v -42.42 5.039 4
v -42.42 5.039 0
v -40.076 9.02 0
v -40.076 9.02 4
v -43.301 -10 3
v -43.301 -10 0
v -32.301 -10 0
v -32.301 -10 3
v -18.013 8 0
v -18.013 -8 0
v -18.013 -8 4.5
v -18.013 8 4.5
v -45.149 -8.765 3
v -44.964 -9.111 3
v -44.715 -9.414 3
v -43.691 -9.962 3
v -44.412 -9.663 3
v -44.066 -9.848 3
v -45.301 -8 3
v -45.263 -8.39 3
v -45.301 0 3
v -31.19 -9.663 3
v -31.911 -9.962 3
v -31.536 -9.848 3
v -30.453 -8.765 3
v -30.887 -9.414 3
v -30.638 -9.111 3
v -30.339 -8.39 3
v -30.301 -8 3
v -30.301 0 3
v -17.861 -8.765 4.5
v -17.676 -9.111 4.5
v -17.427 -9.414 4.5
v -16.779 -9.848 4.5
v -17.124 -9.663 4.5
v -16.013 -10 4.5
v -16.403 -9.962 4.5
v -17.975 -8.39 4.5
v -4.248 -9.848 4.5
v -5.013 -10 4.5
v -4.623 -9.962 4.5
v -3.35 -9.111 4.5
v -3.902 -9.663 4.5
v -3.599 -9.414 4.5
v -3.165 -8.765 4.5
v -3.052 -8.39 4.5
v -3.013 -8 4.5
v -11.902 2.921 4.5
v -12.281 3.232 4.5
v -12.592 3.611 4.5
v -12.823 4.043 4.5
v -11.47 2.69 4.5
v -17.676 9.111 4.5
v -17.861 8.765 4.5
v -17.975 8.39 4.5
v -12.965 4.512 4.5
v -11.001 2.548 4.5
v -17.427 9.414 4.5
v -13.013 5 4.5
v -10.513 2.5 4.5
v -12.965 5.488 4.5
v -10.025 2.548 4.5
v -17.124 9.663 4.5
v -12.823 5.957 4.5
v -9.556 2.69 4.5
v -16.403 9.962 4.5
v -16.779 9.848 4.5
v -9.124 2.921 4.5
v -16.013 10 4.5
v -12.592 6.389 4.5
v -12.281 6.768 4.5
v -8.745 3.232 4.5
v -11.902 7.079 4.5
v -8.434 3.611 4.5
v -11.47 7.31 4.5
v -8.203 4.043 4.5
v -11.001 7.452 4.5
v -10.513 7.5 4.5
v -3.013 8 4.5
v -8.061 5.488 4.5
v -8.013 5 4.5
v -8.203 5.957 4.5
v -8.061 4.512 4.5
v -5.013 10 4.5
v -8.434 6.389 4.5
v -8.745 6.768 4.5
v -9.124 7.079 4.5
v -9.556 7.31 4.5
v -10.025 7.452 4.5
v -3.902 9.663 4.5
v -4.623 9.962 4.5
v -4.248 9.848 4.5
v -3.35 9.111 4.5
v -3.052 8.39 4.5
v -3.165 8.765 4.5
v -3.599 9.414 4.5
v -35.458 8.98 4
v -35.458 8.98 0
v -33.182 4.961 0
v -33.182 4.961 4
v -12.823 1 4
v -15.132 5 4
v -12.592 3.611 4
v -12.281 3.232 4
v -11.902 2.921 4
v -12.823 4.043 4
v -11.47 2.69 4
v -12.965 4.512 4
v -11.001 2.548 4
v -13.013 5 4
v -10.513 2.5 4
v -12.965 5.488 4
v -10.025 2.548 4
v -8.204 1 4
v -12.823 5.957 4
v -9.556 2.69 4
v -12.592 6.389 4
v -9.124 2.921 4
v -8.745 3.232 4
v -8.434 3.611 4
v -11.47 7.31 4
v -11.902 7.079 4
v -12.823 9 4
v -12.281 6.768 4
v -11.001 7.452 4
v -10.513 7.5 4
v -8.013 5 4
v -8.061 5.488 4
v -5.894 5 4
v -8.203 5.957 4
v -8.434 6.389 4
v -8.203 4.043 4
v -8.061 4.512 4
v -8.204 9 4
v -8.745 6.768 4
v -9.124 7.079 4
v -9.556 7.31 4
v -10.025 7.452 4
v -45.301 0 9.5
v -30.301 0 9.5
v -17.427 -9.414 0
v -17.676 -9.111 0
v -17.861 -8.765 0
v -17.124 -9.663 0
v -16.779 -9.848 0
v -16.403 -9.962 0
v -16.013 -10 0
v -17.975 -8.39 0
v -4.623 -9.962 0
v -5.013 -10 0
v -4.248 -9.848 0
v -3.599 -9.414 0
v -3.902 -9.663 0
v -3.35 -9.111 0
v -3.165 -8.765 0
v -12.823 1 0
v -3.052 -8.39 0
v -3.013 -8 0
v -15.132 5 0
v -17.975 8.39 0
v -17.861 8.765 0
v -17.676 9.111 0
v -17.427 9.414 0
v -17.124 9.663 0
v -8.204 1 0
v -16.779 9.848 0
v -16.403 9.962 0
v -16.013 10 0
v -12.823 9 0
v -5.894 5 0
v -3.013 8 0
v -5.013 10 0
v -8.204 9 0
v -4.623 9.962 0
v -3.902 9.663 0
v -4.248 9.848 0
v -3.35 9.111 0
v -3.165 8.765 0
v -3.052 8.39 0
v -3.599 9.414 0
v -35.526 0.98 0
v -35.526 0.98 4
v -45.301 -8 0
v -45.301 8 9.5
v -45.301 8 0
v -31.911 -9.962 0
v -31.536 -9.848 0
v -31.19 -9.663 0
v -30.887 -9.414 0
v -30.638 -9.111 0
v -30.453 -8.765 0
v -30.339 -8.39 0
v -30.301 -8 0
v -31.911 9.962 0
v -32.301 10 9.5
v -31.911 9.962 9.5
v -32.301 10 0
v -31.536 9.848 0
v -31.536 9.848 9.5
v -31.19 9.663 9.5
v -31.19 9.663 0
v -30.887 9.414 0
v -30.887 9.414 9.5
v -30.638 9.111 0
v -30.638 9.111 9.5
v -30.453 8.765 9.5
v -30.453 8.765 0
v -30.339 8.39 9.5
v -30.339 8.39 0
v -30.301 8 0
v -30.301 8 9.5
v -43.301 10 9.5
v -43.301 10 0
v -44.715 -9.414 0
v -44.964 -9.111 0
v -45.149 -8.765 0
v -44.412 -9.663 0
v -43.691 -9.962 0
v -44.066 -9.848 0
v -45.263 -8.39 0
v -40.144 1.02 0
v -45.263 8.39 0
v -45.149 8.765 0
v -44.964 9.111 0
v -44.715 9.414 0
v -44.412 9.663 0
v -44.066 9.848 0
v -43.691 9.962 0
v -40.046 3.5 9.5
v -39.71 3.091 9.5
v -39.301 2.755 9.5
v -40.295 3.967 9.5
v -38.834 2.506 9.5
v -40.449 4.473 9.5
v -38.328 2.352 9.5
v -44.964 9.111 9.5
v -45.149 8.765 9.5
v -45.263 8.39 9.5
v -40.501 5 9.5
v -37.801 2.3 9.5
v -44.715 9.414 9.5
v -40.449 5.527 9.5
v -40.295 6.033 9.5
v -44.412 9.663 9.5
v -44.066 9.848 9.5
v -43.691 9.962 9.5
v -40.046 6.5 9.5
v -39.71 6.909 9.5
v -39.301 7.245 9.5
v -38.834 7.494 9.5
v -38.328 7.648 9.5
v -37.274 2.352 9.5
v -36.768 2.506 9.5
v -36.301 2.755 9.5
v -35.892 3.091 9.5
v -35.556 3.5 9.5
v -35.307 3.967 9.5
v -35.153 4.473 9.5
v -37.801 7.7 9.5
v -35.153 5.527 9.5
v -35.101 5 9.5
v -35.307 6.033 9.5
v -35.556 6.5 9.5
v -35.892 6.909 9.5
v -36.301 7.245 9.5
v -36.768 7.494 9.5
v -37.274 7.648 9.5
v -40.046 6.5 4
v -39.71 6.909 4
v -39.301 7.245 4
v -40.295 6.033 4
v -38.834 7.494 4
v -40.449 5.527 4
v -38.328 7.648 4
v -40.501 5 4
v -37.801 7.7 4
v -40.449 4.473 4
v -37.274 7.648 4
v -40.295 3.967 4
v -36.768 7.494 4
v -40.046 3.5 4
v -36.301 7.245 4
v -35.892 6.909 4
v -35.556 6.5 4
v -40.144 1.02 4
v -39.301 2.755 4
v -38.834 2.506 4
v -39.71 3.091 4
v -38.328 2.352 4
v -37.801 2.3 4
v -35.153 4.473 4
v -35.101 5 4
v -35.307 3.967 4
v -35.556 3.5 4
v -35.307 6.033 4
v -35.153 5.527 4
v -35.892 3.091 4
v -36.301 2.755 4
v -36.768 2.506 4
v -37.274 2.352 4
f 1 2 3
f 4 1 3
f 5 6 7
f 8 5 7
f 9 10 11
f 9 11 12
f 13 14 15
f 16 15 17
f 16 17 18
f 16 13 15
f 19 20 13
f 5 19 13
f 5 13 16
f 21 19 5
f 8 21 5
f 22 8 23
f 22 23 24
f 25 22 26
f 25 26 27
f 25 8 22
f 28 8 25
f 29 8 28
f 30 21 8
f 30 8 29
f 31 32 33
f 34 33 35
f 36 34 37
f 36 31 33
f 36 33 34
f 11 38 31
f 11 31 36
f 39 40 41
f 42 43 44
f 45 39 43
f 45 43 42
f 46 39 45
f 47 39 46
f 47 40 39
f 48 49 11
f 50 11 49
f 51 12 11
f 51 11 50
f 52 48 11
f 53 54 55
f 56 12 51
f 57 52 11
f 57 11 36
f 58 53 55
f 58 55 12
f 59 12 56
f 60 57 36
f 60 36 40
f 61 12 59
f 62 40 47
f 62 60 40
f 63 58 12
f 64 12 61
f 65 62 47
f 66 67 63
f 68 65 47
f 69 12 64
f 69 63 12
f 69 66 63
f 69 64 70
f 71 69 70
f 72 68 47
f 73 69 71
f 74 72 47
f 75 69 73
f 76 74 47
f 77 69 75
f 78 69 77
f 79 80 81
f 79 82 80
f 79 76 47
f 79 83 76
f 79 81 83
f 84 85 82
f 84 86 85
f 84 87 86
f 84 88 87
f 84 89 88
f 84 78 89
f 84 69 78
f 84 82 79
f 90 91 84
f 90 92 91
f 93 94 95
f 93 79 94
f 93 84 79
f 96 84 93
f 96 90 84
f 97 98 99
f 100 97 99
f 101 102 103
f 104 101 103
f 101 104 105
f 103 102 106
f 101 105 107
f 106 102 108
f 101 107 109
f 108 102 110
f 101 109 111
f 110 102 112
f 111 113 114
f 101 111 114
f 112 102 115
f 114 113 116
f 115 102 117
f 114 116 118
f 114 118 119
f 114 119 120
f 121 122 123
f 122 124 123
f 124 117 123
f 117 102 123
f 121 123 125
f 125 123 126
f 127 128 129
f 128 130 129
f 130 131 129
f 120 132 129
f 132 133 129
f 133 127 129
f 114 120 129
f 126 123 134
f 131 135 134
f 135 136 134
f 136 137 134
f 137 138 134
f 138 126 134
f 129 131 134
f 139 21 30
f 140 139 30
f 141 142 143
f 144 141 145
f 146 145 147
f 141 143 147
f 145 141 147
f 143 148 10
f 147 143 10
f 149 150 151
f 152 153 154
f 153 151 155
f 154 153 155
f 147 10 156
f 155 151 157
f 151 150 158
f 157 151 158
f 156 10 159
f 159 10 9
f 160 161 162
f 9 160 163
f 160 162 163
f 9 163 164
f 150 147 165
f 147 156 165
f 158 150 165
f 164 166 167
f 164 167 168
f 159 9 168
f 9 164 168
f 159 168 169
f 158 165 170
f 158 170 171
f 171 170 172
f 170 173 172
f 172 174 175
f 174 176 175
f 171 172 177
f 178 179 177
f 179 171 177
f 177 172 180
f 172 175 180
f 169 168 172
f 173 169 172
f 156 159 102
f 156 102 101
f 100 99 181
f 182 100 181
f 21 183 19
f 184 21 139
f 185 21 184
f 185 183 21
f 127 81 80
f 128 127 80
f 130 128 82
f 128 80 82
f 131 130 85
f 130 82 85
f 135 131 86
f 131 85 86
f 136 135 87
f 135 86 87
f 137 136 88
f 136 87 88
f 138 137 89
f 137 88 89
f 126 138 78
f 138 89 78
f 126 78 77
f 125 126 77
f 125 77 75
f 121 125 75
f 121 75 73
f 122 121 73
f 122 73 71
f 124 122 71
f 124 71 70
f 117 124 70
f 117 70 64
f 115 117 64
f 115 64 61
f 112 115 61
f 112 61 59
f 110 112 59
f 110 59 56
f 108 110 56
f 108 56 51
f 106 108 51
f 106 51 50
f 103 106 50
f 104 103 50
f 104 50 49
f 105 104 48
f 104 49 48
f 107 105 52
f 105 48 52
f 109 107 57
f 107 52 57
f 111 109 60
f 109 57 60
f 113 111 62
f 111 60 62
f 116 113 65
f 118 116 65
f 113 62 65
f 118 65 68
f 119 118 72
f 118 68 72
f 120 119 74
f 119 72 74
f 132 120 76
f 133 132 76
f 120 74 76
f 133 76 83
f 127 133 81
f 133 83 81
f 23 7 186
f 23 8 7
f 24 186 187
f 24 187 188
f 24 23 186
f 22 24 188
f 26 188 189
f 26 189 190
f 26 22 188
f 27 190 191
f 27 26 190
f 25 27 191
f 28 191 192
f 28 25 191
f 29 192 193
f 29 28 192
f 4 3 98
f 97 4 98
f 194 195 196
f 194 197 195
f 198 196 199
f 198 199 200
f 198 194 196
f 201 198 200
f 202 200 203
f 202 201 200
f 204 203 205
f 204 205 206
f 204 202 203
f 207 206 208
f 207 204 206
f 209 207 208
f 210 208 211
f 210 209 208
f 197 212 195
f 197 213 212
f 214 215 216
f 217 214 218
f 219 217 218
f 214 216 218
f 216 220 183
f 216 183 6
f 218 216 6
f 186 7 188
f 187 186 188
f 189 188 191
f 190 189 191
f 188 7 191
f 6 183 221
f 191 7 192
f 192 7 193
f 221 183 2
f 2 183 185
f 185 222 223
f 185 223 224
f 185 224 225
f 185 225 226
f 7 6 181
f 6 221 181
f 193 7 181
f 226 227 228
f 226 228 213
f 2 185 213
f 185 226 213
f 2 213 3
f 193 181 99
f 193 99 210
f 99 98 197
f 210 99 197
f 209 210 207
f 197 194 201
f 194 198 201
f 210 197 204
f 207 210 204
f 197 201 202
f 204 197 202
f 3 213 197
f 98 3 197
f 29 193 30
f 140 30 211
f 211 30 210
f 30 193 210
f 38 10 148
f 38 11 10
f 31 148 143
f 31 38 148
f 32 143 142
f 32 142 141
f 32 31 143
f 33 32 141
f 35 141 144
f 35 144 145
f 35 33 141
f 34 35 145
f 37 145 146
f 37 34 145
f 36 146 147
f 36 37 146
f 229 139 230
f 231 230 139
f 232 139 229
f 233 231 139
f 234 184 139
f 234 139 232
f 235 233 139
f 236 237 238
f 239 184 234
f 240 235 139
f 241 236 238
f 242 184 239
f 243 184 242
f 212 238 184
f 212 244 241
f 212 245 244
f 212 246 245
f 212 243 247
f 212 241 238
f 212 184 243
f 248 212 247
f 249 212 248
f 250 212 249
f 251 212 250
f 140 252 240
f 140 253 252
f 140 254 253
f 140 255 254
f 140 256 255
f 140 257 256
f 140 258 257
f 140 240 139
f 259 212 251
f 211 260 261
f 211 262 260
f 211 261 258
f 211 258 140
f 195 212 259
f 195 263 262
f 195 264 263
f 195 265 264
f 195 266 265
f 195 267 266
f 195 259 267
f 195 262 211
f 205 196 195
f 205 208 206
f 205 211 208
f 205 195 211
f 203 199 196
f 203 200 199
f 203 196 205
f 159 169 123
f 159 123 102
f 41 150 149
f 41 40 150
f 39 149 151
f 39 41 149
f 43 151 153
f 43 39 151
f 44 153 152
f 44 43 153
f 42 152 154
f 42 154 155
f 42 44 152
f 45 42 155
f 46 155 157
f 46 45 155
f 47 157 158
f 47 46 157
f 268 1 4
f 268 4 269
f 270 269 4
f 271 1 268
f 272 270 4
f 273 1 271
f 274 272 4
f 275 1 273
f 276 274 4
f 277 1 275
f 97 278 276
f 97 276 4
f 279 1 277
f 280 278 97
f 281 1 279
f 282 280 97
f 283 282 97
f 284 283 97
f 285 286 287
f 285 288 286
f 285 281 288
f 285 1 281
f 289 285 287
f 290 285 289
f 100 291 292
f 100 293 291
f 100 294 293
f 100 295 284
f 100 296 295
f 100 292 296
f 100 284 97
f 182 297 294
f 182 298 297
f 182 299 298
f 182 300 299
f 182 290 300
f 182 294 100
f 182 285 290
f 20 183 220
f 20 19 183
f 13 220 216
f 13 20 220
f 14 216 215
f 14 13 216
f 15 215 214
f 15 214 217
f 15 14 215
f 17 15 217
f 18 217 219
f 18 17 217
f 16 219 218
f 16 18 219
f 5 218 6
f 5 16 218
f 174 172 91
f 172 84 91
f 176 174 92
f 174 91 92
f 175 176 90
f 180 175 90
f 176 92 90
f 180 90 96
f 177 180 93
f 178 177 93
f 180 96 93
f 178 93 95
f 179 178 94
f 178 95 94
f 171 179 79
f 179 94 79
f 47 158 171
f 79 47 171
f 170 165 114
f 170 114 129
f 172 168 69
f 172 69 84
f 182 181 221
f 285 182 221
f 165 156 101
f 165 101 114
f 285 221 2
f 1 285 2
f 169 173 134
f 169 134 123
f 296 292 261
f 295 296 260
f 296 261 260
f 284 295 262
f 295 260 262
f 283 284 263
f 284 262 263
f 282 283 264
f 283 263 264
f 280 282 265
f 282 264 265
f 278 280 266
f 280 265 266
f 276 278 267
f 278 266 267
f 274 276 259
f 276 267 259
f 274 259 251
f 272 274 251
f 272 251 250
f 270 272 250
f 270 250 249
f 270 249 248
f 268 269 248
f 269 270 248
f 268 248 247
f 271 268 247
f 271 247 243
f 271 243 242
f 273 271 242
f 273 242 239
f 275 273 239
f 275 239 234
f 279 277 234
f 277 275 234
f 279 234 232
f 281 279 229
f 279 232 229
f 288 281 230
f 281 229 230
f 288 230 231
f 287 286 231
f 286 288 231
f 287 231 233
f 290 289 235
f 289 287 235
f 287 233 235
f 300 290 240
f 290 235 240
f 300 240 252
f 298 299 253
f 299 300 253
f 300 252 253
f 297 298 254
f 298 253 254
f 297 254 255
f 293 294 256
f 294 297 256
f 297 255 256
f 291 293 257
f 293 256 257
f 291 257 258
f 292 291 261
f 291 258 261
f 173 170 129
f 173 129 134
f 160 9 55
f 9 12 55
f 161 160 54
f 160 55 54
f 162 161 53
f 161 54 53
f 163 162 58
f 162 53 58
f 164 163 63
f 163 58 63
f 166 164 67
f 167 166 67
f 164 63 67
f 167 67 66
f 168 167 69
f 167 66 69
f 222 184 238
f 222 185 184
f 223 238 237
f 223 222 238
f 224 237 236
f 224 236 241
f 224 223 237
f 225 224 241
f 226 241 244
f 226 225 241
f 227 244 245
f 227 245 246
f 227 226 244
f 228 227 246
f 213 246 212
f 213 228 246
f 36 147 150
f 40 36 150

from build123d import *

# Parameters (mm, degrees)
F0_W      = 15
F0_H      = 20
F1_DEPTH  = 3
F2_W      = 15
F2_H      = 10
F3_DEPTH  = 6.5
F4_R      = 2.7
F5_DEPTH  = 25
F6_R      = 2
F7_W      = 15
F7_H      = 20
F8_DEPTH  = 4.5
F9_R      = 2.5
F10_DEPTH = 25
F11_R     = 2
F12_R     = 2.7
F13_DEPTH = 4
F15_DEPTH = 4


with BuildPart() as f1:
    # F0 (on Top) → F1 (new body)
    with BuildSketch(Plane.XY):
        with Locations((-37.801008, 0)):
            Rectangle(F0_W, F0_H)
    extrude(amount=F1_DEPTH)

    # F2 (on face) → F3 (join)
    with BuildSketch(Plane.XY.offset(3)):
        with Locations((-37.801008, 5)):
            Rectangle(F2_W, F2_H)
    extrude(amount=F3_DEPTH)

    # F4 (on face) → F5 (cut)
    with BuildSketch(Plane.XY.offset(9.5)):
        with Locations((-37.801008, 5)):
            Circle(F4_R)
    extrude(amount=-F5_DEPTH, mode=Mode.SUBTRACT)

    # F6
    f6_edges = [f1.edges().sort_by_distance(p)[0] for p in [
        (-45.301008, -10, 1.5),
        (-30.301008, -10, 1.5),
        (-30.301008, 10, 4.75),
        (-45.301008, 10, 4.75),
    ]]
    fillet(f6_edges, radius=F6_R)

    # F12 (on face) → F13 (cut)
    with BuildSketch(Plane(origin=(0, 0, 0), x_dir=(1, 0, 0), z_dir=(0, 0, -1))):
        Polygon((-42.419643, -5.039323), (-40.076271, -9.019516), (-35.457636, -8.980194), (-33.182373, -4.960677), (-35.525745, -0.980484), (-40.14438, -1.019806), align=None)
        with Locations((-37.801008, -5)):
            Circle(F12_R, mode=Mode.SUBTRACT)
    extrude(amount=-F13_DEPTH, mode=Mode.SUBTRACT)


with BuildPart() as f8:
    # F7 (on Top) → F8 (new body)
    with BuildSketch(Plane.XY):
        with Locations((-10.513142, 0)):
            Rectangle(F7_W, F7_H)
    extrude(amount=F8_DEPTH)

    # F9 (on face) → F10 (cut)
    with BuildSketch(Plane.XY.offset(4.5)):
        with Locations((-10.513142, 5)):
            Circle(F9_R)
    extrude(amount=-F10_DEPTH, mode=Mode.SUBTRACT)

    # F11
    f11_edges = [f8.edges().sort_by_distance(p)[0] for p in [
        (-18.013142, 10, 2.25),
        (-18.013142, -10, 2.25),
        (-3.013142, -10, 2.25),
        (-3.013142, 10, 2.25),
    ]]
    fillet(f11_edges, radius=F11_R)

    # F14 (on Top) → F15 (cut)
    with BuildSketch(Plane.XY):
        Polygon((-12.822543, 1), (-8.203741, 1), (-5.89434, 5), (-8.203741, 9), (-12.822543, 9), (-15.131944, 5), align=None)
    extrude(amount=F15_DEPTH, mode=Mode.SUBTRACT)


solid = Compound([f1.part, f8.part])
